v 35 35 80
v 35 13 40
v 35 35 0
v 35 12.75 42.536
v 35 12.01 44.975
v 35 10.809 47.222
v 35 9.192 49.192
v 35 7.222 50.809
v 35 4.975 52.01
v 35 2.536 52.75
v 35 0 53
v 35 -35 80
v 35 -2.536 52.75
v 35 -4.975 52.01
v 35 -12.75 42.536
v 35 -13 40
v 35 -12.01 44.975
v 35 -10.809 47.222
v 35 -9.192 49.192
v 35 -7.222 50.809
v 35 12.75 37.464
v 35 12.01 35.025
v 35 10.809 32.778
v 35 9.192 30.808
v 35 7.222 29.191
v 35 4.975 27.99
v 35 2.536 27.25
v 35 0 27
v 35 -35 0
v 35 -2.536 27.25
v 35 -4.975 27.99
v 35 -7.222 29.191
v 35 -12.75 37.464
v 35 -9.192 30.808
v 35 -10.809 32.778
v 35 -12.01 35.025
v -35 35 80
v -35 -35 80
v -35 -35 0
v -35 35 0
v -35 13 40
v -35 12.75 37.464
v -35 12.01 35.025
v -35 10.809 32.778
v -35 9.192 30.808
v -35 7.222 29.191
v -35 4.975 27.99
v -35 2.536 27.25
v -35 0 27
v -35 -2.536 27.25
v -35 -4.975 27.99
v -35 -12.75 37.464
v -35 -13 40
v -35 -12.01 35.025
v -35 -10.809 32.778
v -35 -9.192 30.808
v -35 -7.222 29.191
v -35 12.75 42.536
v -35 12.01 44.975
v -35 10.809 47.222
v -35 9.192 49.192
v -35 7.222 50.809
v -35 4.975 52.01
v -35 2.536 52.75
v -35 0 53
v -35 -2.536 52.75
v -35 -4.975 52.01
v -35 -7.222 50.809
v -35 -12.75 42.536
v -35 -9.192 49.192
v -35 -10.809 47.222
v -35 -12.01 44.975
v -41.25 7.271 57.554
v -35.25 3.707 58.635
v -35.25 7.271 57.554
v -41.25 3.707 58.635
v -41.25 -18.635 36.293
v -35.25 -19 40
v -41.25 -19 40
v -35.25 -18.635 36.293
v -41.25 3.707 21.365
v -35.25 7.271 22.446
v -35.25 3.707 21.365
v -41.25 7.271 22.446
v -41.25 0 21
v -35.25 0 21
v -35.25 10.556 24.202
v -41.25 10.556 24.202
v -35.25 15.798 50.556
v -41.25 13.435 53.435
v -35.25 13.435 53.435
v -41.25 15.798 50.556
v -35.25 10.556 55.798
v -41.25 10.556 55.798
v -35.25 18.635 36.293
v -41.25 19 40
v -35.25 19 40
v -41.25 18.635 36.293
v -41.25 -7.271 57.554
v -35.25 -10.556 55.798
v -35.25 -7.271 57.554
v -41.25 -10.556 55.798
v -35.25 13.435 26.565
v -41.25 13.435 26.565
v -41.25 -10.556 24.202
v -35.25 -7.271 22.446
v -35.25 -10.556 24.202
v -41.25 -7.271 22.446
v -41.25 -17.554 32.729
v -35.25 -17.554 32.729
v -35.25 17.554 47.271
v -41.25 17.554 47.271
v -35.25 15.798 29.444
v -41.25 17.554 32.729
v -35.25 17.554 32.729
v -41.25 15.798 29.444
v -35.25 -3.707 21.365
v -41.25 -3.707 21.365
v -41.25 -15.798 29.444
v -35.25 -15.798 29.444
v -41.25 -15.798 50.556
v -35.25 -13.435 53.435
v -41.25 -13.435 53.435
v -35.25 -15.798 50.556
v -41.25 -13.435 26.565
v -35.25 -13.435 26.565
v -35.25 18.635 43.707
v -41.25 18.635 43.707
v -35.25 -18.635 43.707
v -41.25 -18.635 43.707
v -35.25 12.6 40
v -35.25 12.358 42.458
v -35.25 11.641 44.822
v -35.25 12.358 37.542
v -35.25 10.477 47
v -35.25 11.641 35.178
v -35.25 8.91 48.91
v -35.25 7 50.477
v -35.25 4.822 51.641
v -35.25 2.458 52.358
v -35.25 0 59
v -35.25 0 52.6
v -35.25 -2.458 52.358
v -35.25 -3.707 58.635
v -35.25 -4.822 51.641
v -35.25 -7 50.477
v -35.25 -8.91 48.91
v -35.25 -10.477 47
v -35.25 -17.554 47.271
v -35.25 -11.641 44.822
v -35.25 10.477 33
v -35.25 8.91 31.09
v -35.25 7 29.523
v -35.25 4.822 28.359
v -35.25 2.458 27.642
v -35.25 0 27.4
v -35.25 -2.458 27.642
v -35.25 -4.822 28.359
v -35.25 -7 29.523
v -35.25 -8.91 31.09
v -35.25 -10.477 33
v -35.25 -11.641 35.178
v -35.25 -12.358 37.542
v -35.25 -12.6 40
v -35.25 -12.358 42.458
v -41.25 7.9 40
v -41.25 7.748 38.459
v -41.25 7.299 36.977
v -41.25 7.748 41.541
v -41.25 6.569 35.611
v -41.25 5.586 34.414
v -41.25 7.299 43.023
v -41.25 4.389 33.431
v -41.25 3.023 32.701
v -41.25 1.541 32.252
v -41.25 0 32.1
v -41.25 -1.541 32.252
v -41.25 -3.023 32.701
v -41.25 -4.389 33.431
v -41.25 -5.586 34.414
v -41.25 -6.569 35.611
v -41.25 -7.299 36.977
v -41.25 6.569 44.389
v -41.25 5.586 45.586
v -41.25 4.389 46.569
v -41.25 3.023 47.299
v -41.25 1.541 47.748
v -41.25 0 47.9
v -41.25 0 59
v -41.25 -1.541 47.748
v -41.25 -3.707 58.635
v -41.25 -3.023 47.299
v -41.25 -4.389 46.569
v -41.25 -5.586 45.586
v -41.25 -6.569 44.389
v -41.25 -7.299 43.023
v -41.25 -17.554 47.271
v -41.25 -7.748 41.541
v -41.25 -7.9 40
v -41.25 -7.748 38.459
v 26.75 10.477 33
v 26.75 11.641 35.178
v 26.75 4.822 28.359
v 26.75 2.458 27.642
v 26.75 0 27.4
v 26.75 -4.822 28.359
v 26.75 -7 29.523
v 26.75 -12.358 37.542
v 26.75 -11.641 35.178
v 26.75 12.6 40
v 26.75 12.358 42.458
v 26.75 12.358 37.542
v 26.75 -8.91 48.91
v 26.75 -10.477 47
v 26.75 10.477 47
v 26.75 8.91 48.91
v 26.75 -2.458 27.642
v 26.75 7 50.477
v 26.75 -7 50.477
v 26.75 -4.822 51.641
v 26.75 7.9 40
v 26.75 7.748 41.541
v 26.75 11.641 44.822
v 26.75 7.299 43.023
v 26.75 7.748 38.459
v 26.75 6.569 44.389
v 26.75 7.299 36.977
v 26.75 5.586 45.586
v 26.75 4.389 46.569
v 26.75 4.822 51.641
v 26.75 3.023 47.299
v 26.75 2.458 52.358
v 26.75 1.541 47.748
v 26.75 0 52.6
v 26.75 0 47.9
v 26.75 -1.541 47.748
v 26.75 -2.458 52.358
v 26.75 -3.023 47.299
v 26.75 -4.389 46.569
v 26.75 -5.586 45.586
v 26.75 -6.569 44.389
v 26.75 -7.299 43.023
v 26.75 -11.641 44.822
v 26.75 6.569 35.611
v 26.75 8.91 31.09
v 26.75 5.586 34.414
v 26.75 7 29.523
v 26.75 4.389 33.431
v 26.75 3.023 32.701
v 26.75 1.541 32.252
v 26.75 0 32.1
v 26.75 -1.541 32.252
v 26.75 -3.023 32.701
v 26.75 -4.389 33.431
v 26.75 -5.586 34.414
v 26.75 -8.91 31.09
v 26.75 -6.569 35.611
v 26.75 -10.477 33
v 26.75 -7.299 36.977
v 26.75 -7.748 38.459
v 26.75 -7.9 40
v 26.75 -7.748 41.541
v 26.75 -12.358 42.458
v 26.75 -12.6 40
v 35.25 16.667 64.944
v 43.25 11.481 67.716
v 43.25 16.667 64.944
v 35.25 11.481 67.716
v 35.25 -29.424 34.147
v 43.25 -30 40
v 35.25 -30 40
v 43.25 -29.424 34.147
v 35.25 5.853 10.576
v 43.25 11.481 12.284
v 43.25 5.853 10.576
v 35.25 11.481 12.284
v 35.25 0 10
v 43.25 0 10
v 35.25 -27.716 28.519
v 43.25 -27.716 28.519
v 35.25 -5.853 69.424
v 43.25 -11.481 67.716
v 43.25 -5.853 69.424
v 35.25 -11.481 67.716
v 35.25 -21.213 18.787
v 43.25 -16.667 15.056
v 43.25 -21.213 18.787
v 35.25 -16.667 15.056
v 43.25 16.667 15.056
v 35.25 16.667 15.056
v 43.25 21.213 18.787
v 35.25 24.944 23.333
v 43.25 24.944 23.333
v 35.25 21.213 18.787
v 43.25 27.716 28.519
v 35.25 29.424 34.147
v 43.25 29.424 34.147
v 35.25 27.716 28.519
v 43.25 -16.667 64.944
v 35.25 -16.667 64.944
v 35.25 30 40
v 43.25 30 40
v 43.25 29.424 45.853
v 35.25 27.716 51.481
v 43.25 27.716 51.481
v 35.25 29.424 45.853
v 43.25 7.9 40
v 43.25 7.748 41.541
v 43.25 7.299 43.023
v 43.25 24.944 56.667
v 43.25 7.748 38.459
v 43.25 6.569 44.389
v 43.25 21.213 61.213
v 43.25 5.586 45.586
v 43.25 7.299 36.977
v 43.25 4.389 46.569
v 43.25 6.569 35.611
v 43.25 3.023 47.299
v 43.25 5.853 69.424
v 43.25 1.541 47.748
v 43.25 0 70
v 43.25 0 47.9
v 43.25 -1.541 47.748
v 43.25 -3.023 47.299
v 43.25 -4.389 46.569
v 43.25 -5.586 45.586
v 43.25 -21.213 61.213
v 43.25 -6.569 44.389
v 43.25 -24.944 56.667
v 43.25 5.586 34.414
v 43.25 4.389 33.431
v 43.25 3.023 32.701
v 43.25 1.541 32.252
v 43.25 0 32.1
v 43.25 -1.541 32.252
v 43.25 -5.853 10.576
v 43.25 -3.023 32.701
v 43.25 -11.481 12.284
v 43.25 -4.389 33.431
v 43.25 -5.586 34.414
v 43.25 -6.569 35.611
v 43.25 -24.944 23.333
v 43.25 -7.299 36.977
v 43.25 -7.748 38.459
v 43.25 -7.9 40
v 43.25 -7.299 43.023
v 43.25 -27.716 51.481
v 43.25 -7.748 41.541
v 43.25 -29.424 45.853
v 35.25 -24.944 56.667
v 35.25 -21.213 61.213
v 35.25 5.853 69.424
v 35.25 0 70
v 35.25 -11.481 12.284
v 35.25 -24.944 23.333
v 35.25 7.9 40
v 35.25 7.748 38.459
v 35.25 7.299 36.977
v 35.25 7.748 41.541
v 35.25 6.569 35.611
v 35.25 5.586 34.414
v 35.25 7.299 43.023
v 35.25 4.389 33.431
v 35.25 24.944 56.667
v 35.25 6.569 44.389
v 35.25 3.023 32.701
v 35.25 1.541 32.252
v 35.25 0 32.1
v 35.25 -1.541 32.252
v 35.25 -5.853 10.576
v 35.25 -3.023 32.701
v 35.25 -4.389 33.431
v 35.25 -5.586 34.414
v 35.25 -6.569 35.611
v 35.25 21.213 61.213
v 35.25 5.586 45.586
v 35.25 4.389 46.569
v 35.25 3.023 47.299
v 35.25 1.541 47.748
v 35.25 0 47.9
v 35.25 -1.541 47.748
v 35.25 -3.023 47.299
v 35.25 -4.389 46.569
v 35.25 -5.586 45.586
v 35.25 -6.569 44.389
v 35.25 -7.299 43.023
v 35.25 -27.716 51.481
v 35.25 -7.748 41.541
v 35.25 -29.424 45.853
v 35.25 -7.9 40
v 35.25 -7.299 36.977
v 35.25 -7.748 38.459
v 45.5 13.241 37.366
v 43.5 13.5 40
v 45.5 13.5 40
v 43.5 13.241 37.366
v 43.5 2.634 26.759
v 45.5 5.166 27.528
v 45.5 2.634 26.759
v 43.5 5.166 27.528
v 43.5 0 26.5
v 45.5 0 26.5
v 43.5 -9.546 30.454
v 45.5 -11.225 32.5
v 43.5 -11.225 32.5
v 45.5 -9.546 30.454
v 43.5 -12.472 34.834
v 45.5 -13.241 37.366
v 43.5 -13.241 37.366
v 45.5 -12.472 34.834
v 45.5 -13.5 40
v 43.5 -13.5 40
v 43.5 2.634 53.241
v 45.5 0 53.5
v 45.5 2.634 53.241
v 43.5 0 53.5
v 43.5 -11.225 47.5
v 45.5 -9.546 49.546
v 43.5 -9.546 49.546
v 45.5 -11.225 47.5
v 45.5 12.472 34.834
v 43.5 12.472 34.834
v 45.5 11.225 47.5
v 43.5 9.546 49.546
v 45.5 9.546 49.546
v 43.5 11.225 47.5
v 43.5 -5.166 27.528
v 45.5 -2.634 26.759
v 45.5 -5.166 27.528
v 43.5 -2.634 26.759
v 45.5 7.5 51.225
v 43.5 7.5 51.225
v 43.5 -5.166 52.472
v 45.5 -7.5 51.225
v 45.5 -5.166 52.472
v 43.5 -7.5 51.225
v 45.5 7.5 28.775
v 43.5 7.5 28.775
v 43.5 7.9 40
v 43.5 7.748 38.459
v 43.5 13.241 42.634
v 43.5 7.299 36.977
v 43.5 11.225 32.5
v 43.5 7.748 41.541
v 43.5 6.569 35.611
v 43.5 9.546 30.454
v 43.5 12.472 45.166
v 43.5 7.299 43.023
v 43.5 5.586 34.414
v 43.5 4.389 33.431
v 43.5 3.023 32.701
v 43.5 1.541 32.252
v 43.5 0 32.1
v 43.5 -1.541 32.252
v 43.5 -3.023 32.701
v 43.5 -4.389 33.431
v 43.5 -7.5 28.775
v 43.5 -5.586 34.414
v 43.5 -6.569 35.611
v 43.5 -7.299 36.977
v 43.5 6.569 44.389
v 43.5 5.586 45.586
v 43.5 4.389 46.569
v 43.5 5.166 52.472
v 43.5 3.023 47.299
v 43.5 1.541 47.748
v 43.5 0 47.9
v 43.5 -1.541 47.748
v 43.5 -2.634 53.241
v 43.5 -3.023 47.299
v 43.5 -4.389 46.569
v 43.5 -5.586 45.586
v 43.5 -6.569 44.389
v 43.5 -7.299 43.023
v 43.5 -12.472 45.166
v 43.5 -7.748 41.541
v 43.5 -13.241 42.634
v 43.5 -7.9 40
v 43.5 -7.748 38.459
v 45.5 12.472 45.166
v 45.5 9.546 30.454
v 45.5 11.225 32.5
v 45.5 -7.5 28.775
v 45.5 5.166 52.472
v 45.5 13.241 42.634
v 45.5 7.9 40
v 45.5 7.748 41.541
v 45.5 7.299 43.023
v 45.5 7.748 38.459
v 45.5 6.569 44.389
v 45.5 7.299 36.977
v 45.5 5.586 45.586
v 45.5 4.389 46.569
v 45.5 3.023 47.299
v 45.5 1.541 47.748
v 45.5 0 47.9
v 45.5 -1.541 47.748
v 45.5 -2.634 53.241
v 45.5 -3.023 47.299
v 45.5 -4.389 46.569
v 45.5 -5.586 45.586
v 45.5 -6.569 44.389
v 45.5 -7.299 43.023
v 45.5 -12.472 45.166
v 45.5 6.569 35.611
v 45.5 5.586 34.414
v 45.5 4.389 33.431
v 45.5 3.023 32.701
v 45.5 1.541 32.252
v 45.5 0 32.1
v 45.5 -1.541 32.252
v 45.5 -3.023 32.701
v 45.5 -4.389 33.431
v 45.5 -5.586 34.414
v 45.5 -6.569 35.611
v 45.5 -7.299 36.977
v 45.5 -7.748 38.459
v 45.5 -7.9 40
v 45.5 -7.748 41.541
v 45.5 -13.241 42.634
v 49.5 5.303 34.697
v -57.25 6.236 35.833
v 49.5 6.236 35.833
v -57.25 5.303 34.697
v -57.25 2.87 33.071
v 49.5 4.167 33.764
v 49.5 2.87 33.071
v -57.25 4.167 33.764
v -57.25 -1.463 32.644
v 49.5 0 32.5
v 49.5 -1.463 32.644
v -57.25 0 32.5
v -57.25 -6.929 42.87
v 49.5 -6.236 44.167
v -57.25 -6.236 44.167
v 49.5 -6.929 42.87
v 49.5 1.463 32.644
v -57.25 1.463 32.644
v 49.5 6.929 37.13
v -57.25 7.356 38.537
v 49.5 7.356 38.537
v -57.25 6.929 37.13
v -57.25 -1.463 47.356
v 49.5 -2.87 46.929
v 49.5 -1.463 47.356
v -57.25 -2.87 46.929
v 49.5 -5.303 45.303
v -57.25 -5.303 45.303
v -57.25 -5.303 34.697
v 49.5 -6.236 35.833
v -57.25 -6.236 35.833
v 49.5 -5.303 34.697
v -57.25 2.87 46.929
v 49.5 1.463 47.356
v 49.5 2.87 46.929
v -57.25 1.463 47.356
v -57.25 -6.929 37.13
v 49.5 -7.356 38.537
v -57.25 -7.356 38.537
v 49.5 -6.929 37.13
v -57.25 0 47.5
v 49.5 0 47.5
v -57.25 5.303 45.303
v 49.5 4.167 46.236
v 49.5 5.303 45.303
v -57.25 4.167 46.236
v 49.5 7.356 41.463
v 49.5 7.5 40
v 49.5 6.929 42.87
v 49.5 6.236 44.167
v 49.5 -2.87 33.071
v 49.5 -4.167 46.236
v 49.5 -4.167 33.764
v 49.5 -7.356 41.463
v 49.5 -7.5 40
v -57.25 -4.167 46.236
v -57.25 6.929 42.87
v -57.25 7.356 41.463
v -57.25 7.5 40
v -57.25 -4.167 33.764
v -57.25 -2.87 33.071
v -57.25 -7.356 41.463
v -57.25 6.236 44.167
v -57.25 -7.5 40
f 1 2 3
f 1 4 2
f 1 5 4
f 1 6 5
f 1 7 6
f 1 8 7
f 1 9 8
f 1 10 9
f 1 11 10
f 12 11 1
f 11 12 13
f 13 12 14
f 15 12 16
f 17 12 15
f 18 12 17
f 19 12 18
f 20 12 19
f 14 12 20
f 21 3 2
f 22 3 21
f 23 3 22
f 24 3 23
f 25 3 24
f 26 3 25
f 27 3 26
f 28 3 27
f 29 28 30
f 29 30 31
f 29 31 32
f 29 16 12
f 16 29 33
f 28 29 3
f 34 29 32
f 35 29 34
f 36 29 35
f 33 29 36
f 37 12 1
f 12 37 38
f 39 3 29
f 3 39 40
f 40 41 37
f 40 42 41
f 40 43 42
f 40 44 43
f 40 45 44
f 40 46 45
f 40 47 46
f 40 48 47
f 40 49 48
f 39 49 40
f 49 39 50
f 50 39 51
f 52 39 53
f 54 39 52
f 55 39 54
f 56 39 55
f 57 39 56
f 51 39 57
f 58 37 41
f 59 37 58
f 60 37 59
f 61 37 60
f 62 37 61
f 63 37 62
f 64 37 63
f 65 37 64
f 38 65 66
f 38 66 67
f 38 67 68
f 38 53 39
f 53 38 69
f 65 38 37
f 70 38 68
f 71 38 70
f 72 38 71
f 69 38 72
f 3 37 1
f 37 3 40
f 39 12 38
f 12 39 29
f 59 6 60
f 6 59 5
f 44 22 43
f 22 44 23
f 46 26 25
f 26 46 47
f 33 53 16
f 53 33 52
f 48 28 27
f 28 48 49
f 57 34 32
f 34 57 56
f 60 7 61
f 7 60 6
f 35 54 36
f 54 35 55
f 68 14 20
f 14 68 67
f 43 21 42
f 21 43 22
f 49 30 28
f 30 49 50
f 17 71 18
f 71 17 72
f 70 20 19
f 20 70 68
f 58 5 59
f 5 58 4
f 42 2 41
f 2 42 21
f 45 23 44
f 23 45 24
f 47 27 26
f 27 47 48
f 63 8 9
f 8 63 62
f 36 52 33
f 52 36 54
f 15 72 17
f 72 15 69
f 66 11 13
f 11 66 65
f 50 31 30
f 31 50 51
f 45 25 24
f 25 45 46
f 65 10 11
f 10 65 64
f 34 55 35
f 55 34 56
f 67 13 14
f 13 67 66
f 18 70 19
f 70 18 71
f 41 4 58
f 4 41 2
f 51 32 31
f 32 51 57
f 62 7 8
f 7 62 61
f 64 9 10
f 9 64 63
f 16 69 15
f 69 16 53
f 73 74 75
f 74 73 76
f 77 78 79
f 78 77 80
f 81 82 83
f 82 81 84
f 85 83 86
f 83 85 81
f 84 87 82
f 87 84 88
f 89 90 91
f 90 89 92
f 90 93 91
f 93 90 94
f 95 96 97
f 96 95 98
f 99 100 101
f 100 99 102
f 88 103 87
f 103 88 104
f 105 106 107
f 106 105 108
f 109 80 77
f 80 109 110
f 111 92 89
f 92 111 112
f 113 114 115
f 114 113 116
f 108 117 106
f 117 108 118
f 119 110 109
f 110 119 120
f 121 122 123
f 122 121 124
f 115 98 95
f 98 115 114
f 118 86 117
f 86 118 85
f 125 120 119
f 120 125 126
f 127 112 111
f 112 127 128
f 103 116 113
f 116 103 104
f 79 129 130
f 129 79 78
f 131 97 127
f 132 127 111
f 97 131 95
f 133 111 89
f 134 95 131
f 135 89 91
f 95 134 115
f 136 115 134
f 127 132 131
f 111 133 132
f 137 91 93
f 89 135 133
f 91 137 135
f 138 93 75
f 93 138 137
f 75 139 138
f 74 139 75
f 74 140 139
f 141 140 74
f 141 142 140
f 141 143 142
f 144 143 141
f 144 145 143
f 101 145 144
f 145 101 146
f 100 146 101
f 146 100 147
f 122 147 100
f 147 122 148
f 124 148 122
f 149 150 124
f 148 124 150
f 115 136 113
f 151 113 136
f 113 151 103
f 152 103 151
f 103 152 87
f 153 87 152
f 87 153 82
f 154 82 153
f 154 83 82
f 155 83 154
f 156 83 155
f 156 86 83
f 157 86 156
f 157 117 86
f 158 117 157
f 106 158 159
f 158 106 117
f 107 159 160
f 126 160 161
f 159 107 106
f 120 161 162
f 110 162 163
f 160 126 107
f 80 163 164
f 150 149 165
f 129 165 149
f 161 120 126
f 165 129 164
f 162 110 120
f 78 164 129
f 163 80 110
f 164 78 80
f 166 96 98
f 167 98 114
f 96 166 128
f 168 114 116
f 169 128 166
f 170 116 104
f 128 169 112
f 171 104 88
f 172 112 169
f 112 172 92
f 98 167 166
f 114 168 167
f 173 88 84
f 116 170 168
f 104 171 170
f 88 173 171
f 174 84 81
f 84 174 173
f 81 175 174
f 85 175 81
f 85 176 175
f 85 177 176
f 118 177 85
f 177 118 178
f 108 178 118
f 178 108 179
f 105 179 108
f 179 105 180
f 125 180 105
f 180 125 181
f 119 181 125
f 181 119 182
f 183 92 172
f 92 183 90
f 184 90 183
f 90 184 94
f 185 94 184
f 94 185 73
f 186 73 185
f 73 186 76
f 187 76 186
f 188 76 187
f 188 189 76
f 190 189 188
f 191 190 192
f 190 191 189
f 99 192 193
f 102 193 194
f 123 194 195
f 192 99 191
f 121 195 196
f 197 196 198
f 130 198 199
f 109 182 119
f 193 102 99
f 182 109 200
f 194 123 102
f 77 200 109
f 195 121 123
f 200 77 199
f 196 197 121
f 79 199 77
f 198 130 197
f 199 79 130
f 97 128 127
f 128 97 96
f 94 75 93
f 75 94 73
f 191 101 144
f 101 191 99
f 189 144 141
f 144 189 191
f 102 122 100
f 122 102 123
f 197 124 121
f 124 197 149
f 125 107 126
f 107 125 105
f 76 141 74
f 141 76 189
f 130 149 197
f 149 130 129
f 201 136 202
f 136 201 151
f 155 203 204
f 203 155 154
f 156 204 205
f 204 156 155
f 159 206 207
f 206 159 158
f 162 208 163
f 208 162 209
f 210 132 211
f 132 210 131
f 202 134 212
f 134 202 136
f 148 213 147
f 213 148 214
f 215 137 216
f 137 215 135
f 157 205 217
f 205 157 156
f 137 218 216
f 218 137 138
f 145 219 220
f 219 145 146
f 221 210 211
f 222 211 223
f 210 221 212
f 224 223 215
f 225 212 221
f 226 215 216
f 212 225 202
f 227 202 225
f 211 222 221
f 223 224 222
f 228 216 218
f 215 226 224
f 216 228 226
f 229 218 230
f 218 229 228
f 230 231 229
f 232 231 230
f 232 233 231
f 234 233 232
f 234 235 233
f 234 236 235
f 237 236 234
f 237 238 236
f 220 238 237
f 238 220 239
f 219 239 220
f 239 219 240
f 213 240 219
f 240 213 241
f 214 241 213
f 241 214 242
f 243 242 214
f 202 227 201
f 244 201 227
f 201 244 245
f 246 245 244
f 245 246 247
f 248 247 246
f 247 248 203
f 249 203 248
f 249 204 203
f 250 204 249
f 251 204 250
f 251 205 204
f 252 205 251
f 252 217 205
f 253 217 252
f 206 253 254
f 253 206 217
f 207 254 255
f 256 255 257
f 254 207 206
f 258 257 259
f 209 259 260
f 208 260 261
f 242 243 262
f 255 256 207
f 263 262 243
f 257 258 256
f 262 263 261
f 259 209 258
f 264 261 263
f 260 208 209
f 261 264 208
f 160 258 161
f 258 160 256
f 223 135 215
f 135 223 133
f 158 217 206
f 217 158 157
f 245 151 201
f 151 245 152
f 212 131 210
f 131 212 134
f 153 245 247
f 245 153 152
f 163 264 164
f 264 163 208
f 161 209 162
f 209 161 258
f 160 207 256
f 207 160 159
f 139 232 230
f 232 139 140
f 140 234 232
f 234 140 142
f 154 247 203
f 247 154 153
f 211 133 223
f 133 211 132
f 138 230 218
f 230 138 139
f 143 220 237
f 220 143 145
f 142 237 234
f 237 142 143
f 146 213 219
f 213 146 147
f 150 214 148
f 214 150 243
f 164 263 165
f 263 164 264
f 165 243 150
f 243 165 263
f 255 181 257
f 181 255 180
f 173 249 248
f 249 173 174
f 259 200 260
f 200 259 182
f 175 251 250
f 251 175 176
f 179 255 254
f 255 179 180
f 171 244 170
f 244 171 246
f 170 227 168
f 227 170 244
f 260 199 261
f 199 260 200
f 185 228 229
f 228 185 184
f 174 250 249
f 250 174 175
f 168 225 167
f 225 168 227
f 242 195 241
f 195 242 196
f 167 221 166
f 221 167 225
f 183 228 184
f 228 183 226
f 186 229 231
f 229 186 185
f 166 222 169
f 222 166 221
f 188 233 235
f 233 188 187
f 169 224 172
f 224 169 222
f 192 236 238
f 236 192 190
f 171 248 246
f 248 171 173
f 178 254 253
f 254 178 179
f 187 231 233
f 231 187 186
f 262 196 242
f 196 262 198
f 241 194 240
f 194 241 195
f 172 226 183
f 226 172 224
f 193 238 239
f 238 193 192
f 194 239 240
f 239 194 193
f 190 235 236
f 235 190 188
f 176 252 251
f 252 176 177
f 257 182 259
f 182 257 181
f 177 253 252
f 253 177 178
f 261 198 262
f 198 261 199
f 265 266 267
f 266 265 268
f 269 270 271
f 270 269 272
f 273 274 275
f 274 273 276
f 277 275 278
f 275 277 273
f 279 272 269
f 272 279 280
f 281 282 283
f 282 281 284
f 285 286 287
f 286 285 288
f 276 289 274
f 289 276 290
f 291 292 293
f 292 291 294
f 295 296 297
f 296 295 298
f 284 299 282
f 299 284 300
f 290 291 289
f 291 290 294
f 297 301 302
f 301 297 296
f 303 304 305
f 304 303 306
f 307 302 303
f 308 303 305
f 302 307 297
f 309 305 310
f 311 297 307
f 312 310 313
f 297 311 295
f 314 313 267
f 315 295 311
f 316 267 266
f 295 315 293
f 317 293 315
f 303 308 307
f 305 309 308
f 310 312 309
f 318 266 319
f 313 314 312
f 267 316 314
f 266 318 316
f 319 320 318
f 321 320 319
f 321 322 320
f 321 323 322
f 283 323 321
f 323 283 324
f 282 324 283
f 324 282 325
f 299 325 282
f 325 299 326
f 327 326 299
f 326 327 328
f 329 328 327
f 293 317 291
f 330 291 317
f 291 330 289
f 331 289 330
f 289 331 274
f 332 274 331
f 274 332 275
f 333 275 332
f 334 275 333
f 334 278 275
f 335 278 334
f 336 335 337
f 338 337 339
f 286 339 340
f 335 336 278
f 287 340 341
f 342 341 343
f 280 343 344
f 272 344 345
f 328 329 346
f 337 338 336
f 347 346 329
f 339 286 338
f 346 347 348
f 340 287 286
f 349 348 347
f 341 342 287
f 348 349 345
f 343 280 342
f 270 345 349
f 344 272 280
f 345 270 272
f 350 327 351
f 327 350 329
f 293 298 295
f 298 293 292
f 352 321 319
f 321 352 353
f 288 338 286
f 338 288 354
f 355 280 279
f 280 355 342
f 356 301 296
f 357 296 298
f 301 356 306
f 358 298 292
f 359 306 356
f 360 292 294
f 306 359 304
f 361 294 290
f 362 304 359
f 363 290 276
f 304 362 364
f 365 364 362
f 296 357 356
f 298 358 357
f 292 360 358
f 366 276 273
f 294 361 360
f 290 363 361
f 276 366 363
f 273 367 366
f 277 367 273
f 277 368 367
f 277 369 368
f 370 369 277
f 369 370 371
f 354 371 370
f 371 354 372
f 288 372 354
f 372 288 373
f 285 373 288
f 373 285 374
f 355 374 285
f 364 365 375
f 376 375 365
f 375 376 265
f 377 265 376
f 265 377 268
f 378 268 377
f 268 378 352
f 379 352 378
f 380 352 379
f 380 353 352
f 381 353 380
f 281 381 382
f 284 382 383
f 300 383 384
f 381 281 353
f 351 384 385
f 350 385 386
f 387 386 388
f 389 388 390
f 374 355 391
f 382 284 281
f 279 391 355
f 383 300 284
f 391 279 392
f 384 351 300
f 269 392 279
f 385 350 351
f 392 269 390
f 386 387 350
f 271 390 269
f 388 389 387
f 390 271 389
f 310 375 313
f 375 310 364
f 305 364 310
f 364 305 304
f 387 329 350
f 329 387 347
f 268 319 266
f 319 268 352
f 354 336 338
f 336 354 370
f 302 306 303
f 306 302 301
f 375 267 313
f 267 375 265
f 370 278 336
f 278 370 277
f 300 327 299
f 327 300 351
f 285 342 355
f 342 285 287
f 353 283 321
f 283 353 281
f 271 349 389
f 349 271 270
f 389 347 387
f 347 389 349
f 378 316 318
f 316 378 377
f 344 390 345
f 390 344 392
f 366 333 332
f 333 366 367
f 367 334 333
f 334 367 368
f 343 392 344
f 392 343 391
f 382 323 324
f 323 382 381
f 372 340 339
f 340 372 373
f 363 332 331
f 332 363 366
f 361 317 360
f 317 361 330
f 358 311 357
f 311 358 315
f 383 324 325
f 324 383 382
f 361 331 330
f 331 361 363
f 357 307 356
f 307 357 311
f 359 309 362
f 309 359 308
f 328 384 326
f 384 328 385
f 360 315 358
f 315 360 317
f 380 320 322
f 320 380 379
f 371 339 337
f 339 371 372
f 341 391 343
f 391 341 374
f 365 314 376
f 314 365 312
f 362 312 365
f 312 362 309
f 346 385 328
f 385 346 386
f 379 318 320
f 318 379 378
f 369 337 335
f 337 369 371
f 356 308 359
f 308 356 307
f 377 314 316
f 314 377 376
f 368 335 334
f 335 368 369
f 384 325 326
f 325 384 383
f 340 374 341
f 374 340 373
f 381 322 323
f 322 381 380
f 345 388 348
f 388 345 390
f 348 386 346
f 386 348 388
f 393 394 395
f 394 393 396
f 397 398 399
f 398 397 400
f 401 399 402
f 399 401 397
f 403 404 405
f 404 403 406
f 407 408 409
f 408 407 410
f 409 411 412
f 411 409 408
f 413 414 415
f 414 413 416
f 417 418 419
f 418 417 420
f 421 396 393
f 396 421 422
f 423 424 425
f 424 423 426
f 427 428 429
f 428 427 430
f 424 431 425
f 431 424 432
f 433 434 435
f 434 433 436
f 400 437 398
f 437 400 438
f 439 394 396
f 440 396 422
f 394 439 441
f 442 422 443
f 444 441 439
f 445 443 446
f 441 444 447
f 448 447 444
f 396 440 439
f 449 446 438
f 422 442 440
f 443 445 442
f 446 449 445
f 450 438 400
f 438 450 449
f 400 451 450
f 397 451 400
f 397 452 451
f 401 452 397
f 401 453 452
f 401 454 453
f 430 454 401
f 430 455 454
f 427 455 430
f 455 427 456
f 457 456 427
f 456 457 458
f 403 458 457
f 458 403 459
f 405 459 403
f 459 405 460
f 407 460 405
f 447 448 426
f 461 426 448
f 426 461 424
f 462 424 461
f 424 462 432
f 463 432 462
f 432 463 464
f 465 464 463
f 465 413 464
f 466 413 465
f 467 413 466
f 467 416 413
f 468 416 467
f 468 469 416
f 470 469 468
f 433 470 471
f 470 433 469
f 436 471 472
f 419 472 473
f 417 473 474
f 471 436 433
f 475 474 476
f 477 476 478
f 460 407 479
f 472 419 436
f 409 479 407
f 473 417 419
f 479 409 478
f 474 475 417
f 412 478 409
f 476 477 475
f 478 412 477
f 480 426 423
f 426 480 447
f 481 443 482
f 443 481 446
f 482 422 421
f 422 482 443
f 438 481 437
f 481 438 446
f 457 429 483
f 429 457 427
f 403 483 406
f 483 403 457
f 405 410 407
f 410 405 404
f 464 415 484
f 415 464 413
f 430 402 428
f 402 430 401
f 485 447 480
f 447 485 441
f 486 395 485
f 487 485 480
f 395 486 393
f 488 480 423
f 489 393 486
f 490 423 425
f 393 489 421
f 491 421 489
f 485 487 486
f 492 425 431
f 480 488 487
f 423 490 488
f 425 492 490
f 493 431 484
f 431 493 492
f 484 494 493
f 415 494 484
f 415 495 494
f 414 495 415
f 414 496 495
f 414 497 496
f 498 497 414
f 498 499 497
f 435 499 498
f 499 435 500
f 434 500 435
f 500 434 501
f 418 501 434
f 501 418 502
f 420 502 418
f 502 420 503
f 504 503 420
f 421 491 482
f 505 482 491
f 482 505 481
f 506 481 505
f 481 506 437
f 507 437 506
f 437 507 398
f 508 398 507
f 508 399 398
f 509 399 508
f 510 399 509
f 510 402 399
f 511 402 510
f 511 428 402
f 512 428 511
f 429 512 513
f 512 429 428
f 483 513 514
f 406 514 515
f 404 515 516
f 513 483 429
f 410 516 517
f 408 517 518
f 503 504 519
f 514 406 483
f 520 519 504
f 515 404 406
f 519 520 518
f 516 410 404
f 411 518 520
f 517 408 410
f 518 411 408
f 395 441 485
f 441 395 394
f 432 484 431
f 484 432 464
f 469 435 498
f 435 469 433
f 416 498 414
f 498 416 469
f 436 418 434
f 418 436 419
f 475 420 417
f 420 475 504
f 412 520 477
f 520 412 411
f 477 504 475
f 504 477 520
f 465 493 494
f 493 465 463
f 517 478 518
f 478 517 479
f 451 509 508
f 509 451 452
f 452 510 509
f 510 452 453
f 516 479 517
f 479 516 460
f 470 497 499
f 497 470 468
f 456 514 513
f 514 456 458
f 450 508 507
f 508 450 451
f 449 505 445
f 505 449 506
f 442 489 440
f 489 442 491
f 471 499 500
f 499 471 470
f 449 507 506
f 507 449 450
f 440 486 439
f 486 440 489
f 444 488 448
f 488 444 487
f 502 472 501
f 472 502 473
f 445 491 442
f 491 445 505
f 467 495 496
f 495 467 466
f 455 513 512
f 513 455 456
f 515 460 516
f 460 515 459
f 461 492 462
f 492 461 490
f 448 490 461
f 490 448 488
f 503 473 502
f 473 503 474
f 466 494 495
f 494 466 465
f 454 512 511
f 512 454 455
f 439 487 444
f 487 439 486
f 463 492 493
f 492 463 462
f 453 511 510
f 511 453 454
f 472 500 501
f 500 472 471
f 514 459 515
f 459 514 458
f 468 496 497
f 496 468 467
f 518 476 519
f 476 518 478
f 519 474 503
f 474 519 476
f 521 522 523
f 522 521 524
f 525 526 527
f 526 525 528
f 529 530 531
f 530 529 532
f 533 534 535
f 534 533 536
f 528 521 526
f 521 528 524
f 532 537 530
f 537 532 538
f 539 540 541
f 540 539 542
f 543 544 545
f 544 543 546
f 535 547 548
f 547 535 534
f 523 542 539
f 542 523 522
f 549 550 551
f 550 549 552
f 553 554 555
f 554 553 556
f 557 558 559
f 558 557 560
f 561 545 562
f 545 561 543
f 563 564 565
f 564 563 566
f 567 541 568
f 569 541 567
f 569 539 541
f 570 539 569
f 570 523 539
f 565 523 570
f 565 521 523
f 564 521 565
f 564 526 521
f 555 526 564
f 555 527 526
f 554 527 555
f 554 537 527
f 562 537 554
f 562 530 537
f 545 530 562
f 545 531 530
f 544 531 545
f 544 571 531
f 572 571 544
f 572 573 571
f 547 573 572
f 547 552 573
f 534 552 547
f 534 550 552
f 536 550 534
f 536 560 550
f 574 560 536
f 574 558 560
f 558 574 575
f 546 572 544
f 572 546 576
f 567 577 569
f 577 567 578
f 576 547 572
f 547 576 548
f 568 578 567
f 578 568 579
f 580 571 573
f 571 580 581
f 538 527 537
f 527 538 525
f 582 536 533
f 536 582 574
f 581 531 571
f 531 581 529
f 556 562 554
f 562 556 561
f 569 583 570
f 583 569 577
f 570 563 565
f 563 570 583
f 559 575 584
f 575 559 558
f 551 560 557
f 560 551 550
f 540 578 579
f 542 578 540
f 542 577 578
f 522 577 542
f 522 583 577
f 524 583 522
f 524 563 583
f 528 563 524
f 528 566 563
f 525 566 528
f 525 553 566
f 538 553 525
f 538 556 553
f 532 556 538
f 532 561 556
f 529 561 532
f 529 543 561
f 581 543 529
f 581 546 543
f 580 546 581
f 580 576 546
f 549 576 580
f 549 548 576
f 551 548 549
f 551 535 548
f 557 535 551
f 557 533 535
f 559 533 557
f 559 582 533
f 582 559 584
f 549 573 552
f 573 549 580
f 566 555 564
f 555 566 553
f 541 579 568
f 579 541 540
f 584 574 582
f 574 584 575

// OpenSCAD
$fn = 32;

// ------------------------------------------------------------------------
// Bushed housing: 70 x 70 x 80 mm housing, bushing d25.2
// Every part is its own module, assembly() places them once.
// ------------------------------------------------------------------------

// --- part 1 ---
module housing() {
  difference() {
    translate([-35, -35, 0]) cube([70, 70, 80]);
    translate([0, 0, 40]) rotate([0, 90, 0]) cylinder(h = 72, d = 26, center = true);
  }
}

// --- part 2 ---
module bushing() {
  difference() {
    union() {
      cylinder(h = 6, d = 38);
      translate([0, 0, 6]) cylinder(h = 62, d = 25.2);
    }
    translate([0, 0, -1]) cylinder(h = 70, d = 15.8);
  }
}

// --- part 3 ---
module shaft() {
  translate([0, 0, -53.375]) cylinder(h = 106.75, d = 15);
}

// --- part 4 ---
module cover() {
  difference() {
    cylinder(h = 8, d = 60);
    translate([0, 0, -1]) cylinder(h = 10, d = 15.8);
  }
}

// --- part 5 ---
module washer() {
  difference() {
      translate([0, 0, 0]) cylinder(h = 2, d = 27);
      translate([0, 0, -1]) cylinder(h = 4, d = 15.8);
    }
}

// --- assembly ---
module assembly() {
  translate([0, 0, 0]) rotate([0, 0, 0]) housing();
  translate([-41.25, 0, 40]) rotate([0, 90, 0]) bushing();
  translate([-3.875, 0, 40]) rotate([0, 90, 0]) shaft();
  translate([35.25, 0, 40]) rotate([0, 90, 0]) cover();
  translate([43.5, 0, 40]) rotate([0, 90, 0]) washer();
}

assembly();
